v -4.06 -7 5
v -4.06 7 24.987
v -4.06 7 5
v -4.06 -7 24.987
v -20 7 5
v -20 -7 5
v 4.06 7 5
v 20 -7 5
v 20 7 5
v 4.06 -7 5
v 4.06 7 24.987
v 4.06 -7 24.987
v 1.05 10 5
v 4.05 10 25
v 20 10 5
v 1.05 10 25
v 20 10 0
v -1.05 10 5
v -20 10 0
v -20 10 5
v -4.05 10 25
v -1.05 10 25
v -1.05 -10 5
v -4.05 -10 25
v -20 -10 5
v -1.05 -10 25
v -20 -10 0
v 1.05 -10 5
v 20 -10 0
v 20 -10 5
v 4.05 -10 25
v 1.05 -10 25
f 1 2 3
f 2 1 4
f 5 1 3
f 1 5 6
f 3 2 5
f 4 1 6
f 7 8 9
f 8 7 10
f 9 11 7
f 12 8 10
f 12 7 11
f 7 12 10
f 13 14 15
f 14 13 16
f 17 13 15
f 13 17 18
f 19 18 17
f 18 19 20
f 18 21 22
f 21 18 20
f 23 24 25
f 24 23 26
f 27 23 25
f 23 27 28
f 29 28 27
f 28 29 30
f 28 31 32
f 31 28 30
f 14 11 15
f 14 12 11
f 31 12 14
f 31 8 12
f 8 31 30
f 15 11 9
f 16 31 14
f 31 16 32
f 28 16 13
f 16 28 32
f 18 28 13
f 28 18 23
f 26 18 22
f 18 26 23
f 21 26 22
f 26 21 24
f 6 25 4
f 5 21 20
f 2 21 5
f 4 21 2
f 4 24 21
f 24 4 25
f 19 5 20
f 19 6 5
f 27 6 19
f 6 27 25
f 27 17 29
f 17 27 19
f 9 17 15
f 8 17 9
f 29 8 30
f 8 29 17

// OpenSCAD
include <MCAD/units.scad>

/* [Stand] */

// Length of the stand (along gap)
standLength = 20;
// Width of the stand (perpendicular to gap)
standWidth = 40;
// Height of the stand (base included)
standTotalHeight = 25;
// Width of the center gap
standGapWidth = 2.1;
// Thickness of the stand base
standBaseThickness = 5;
// Thickness of the vertical walls
standWallThickness = 3;

module Stand() {
    translate([0, standLength / 2, 0])
    difference() {
        rotate([90, 0, 0])
        linear_extrude(standLength, convexity = 2)
        polygon([
            [-standWidth / 2, 0],
            [-standWidth / 2, standBaseThickness],
            [-standGapWidth / 2 - standWallThickness, standTotalHeight],
            [-standGapWidth / 2, standTotalHeight],
            [-standGapWidth / 2, standBaseThickness],
            [standGapWidth / 2, standBaseThickness],
            [standGapWidth / 2, standTotalHeight],
            [standGapWidth / 2 + standWallThickness, standTotalHeight],
            [standWidth / 2, standBaseThickness],
            [standWidth / 2, 0],
        ]);
        for (x = [0, 1])
            mirror([x, 0, 0])
            translate([-standWidth / 2 - epsilon, -standLength + standWallThickness, standBaseThickness])
            cube([standWidth / 2 - standGapWidth / 2 - standWallThickness, standLength - standWallThickness * 2, standTotalHeight - standBaseThickness + epsilon]);
    }
}

Stand();
